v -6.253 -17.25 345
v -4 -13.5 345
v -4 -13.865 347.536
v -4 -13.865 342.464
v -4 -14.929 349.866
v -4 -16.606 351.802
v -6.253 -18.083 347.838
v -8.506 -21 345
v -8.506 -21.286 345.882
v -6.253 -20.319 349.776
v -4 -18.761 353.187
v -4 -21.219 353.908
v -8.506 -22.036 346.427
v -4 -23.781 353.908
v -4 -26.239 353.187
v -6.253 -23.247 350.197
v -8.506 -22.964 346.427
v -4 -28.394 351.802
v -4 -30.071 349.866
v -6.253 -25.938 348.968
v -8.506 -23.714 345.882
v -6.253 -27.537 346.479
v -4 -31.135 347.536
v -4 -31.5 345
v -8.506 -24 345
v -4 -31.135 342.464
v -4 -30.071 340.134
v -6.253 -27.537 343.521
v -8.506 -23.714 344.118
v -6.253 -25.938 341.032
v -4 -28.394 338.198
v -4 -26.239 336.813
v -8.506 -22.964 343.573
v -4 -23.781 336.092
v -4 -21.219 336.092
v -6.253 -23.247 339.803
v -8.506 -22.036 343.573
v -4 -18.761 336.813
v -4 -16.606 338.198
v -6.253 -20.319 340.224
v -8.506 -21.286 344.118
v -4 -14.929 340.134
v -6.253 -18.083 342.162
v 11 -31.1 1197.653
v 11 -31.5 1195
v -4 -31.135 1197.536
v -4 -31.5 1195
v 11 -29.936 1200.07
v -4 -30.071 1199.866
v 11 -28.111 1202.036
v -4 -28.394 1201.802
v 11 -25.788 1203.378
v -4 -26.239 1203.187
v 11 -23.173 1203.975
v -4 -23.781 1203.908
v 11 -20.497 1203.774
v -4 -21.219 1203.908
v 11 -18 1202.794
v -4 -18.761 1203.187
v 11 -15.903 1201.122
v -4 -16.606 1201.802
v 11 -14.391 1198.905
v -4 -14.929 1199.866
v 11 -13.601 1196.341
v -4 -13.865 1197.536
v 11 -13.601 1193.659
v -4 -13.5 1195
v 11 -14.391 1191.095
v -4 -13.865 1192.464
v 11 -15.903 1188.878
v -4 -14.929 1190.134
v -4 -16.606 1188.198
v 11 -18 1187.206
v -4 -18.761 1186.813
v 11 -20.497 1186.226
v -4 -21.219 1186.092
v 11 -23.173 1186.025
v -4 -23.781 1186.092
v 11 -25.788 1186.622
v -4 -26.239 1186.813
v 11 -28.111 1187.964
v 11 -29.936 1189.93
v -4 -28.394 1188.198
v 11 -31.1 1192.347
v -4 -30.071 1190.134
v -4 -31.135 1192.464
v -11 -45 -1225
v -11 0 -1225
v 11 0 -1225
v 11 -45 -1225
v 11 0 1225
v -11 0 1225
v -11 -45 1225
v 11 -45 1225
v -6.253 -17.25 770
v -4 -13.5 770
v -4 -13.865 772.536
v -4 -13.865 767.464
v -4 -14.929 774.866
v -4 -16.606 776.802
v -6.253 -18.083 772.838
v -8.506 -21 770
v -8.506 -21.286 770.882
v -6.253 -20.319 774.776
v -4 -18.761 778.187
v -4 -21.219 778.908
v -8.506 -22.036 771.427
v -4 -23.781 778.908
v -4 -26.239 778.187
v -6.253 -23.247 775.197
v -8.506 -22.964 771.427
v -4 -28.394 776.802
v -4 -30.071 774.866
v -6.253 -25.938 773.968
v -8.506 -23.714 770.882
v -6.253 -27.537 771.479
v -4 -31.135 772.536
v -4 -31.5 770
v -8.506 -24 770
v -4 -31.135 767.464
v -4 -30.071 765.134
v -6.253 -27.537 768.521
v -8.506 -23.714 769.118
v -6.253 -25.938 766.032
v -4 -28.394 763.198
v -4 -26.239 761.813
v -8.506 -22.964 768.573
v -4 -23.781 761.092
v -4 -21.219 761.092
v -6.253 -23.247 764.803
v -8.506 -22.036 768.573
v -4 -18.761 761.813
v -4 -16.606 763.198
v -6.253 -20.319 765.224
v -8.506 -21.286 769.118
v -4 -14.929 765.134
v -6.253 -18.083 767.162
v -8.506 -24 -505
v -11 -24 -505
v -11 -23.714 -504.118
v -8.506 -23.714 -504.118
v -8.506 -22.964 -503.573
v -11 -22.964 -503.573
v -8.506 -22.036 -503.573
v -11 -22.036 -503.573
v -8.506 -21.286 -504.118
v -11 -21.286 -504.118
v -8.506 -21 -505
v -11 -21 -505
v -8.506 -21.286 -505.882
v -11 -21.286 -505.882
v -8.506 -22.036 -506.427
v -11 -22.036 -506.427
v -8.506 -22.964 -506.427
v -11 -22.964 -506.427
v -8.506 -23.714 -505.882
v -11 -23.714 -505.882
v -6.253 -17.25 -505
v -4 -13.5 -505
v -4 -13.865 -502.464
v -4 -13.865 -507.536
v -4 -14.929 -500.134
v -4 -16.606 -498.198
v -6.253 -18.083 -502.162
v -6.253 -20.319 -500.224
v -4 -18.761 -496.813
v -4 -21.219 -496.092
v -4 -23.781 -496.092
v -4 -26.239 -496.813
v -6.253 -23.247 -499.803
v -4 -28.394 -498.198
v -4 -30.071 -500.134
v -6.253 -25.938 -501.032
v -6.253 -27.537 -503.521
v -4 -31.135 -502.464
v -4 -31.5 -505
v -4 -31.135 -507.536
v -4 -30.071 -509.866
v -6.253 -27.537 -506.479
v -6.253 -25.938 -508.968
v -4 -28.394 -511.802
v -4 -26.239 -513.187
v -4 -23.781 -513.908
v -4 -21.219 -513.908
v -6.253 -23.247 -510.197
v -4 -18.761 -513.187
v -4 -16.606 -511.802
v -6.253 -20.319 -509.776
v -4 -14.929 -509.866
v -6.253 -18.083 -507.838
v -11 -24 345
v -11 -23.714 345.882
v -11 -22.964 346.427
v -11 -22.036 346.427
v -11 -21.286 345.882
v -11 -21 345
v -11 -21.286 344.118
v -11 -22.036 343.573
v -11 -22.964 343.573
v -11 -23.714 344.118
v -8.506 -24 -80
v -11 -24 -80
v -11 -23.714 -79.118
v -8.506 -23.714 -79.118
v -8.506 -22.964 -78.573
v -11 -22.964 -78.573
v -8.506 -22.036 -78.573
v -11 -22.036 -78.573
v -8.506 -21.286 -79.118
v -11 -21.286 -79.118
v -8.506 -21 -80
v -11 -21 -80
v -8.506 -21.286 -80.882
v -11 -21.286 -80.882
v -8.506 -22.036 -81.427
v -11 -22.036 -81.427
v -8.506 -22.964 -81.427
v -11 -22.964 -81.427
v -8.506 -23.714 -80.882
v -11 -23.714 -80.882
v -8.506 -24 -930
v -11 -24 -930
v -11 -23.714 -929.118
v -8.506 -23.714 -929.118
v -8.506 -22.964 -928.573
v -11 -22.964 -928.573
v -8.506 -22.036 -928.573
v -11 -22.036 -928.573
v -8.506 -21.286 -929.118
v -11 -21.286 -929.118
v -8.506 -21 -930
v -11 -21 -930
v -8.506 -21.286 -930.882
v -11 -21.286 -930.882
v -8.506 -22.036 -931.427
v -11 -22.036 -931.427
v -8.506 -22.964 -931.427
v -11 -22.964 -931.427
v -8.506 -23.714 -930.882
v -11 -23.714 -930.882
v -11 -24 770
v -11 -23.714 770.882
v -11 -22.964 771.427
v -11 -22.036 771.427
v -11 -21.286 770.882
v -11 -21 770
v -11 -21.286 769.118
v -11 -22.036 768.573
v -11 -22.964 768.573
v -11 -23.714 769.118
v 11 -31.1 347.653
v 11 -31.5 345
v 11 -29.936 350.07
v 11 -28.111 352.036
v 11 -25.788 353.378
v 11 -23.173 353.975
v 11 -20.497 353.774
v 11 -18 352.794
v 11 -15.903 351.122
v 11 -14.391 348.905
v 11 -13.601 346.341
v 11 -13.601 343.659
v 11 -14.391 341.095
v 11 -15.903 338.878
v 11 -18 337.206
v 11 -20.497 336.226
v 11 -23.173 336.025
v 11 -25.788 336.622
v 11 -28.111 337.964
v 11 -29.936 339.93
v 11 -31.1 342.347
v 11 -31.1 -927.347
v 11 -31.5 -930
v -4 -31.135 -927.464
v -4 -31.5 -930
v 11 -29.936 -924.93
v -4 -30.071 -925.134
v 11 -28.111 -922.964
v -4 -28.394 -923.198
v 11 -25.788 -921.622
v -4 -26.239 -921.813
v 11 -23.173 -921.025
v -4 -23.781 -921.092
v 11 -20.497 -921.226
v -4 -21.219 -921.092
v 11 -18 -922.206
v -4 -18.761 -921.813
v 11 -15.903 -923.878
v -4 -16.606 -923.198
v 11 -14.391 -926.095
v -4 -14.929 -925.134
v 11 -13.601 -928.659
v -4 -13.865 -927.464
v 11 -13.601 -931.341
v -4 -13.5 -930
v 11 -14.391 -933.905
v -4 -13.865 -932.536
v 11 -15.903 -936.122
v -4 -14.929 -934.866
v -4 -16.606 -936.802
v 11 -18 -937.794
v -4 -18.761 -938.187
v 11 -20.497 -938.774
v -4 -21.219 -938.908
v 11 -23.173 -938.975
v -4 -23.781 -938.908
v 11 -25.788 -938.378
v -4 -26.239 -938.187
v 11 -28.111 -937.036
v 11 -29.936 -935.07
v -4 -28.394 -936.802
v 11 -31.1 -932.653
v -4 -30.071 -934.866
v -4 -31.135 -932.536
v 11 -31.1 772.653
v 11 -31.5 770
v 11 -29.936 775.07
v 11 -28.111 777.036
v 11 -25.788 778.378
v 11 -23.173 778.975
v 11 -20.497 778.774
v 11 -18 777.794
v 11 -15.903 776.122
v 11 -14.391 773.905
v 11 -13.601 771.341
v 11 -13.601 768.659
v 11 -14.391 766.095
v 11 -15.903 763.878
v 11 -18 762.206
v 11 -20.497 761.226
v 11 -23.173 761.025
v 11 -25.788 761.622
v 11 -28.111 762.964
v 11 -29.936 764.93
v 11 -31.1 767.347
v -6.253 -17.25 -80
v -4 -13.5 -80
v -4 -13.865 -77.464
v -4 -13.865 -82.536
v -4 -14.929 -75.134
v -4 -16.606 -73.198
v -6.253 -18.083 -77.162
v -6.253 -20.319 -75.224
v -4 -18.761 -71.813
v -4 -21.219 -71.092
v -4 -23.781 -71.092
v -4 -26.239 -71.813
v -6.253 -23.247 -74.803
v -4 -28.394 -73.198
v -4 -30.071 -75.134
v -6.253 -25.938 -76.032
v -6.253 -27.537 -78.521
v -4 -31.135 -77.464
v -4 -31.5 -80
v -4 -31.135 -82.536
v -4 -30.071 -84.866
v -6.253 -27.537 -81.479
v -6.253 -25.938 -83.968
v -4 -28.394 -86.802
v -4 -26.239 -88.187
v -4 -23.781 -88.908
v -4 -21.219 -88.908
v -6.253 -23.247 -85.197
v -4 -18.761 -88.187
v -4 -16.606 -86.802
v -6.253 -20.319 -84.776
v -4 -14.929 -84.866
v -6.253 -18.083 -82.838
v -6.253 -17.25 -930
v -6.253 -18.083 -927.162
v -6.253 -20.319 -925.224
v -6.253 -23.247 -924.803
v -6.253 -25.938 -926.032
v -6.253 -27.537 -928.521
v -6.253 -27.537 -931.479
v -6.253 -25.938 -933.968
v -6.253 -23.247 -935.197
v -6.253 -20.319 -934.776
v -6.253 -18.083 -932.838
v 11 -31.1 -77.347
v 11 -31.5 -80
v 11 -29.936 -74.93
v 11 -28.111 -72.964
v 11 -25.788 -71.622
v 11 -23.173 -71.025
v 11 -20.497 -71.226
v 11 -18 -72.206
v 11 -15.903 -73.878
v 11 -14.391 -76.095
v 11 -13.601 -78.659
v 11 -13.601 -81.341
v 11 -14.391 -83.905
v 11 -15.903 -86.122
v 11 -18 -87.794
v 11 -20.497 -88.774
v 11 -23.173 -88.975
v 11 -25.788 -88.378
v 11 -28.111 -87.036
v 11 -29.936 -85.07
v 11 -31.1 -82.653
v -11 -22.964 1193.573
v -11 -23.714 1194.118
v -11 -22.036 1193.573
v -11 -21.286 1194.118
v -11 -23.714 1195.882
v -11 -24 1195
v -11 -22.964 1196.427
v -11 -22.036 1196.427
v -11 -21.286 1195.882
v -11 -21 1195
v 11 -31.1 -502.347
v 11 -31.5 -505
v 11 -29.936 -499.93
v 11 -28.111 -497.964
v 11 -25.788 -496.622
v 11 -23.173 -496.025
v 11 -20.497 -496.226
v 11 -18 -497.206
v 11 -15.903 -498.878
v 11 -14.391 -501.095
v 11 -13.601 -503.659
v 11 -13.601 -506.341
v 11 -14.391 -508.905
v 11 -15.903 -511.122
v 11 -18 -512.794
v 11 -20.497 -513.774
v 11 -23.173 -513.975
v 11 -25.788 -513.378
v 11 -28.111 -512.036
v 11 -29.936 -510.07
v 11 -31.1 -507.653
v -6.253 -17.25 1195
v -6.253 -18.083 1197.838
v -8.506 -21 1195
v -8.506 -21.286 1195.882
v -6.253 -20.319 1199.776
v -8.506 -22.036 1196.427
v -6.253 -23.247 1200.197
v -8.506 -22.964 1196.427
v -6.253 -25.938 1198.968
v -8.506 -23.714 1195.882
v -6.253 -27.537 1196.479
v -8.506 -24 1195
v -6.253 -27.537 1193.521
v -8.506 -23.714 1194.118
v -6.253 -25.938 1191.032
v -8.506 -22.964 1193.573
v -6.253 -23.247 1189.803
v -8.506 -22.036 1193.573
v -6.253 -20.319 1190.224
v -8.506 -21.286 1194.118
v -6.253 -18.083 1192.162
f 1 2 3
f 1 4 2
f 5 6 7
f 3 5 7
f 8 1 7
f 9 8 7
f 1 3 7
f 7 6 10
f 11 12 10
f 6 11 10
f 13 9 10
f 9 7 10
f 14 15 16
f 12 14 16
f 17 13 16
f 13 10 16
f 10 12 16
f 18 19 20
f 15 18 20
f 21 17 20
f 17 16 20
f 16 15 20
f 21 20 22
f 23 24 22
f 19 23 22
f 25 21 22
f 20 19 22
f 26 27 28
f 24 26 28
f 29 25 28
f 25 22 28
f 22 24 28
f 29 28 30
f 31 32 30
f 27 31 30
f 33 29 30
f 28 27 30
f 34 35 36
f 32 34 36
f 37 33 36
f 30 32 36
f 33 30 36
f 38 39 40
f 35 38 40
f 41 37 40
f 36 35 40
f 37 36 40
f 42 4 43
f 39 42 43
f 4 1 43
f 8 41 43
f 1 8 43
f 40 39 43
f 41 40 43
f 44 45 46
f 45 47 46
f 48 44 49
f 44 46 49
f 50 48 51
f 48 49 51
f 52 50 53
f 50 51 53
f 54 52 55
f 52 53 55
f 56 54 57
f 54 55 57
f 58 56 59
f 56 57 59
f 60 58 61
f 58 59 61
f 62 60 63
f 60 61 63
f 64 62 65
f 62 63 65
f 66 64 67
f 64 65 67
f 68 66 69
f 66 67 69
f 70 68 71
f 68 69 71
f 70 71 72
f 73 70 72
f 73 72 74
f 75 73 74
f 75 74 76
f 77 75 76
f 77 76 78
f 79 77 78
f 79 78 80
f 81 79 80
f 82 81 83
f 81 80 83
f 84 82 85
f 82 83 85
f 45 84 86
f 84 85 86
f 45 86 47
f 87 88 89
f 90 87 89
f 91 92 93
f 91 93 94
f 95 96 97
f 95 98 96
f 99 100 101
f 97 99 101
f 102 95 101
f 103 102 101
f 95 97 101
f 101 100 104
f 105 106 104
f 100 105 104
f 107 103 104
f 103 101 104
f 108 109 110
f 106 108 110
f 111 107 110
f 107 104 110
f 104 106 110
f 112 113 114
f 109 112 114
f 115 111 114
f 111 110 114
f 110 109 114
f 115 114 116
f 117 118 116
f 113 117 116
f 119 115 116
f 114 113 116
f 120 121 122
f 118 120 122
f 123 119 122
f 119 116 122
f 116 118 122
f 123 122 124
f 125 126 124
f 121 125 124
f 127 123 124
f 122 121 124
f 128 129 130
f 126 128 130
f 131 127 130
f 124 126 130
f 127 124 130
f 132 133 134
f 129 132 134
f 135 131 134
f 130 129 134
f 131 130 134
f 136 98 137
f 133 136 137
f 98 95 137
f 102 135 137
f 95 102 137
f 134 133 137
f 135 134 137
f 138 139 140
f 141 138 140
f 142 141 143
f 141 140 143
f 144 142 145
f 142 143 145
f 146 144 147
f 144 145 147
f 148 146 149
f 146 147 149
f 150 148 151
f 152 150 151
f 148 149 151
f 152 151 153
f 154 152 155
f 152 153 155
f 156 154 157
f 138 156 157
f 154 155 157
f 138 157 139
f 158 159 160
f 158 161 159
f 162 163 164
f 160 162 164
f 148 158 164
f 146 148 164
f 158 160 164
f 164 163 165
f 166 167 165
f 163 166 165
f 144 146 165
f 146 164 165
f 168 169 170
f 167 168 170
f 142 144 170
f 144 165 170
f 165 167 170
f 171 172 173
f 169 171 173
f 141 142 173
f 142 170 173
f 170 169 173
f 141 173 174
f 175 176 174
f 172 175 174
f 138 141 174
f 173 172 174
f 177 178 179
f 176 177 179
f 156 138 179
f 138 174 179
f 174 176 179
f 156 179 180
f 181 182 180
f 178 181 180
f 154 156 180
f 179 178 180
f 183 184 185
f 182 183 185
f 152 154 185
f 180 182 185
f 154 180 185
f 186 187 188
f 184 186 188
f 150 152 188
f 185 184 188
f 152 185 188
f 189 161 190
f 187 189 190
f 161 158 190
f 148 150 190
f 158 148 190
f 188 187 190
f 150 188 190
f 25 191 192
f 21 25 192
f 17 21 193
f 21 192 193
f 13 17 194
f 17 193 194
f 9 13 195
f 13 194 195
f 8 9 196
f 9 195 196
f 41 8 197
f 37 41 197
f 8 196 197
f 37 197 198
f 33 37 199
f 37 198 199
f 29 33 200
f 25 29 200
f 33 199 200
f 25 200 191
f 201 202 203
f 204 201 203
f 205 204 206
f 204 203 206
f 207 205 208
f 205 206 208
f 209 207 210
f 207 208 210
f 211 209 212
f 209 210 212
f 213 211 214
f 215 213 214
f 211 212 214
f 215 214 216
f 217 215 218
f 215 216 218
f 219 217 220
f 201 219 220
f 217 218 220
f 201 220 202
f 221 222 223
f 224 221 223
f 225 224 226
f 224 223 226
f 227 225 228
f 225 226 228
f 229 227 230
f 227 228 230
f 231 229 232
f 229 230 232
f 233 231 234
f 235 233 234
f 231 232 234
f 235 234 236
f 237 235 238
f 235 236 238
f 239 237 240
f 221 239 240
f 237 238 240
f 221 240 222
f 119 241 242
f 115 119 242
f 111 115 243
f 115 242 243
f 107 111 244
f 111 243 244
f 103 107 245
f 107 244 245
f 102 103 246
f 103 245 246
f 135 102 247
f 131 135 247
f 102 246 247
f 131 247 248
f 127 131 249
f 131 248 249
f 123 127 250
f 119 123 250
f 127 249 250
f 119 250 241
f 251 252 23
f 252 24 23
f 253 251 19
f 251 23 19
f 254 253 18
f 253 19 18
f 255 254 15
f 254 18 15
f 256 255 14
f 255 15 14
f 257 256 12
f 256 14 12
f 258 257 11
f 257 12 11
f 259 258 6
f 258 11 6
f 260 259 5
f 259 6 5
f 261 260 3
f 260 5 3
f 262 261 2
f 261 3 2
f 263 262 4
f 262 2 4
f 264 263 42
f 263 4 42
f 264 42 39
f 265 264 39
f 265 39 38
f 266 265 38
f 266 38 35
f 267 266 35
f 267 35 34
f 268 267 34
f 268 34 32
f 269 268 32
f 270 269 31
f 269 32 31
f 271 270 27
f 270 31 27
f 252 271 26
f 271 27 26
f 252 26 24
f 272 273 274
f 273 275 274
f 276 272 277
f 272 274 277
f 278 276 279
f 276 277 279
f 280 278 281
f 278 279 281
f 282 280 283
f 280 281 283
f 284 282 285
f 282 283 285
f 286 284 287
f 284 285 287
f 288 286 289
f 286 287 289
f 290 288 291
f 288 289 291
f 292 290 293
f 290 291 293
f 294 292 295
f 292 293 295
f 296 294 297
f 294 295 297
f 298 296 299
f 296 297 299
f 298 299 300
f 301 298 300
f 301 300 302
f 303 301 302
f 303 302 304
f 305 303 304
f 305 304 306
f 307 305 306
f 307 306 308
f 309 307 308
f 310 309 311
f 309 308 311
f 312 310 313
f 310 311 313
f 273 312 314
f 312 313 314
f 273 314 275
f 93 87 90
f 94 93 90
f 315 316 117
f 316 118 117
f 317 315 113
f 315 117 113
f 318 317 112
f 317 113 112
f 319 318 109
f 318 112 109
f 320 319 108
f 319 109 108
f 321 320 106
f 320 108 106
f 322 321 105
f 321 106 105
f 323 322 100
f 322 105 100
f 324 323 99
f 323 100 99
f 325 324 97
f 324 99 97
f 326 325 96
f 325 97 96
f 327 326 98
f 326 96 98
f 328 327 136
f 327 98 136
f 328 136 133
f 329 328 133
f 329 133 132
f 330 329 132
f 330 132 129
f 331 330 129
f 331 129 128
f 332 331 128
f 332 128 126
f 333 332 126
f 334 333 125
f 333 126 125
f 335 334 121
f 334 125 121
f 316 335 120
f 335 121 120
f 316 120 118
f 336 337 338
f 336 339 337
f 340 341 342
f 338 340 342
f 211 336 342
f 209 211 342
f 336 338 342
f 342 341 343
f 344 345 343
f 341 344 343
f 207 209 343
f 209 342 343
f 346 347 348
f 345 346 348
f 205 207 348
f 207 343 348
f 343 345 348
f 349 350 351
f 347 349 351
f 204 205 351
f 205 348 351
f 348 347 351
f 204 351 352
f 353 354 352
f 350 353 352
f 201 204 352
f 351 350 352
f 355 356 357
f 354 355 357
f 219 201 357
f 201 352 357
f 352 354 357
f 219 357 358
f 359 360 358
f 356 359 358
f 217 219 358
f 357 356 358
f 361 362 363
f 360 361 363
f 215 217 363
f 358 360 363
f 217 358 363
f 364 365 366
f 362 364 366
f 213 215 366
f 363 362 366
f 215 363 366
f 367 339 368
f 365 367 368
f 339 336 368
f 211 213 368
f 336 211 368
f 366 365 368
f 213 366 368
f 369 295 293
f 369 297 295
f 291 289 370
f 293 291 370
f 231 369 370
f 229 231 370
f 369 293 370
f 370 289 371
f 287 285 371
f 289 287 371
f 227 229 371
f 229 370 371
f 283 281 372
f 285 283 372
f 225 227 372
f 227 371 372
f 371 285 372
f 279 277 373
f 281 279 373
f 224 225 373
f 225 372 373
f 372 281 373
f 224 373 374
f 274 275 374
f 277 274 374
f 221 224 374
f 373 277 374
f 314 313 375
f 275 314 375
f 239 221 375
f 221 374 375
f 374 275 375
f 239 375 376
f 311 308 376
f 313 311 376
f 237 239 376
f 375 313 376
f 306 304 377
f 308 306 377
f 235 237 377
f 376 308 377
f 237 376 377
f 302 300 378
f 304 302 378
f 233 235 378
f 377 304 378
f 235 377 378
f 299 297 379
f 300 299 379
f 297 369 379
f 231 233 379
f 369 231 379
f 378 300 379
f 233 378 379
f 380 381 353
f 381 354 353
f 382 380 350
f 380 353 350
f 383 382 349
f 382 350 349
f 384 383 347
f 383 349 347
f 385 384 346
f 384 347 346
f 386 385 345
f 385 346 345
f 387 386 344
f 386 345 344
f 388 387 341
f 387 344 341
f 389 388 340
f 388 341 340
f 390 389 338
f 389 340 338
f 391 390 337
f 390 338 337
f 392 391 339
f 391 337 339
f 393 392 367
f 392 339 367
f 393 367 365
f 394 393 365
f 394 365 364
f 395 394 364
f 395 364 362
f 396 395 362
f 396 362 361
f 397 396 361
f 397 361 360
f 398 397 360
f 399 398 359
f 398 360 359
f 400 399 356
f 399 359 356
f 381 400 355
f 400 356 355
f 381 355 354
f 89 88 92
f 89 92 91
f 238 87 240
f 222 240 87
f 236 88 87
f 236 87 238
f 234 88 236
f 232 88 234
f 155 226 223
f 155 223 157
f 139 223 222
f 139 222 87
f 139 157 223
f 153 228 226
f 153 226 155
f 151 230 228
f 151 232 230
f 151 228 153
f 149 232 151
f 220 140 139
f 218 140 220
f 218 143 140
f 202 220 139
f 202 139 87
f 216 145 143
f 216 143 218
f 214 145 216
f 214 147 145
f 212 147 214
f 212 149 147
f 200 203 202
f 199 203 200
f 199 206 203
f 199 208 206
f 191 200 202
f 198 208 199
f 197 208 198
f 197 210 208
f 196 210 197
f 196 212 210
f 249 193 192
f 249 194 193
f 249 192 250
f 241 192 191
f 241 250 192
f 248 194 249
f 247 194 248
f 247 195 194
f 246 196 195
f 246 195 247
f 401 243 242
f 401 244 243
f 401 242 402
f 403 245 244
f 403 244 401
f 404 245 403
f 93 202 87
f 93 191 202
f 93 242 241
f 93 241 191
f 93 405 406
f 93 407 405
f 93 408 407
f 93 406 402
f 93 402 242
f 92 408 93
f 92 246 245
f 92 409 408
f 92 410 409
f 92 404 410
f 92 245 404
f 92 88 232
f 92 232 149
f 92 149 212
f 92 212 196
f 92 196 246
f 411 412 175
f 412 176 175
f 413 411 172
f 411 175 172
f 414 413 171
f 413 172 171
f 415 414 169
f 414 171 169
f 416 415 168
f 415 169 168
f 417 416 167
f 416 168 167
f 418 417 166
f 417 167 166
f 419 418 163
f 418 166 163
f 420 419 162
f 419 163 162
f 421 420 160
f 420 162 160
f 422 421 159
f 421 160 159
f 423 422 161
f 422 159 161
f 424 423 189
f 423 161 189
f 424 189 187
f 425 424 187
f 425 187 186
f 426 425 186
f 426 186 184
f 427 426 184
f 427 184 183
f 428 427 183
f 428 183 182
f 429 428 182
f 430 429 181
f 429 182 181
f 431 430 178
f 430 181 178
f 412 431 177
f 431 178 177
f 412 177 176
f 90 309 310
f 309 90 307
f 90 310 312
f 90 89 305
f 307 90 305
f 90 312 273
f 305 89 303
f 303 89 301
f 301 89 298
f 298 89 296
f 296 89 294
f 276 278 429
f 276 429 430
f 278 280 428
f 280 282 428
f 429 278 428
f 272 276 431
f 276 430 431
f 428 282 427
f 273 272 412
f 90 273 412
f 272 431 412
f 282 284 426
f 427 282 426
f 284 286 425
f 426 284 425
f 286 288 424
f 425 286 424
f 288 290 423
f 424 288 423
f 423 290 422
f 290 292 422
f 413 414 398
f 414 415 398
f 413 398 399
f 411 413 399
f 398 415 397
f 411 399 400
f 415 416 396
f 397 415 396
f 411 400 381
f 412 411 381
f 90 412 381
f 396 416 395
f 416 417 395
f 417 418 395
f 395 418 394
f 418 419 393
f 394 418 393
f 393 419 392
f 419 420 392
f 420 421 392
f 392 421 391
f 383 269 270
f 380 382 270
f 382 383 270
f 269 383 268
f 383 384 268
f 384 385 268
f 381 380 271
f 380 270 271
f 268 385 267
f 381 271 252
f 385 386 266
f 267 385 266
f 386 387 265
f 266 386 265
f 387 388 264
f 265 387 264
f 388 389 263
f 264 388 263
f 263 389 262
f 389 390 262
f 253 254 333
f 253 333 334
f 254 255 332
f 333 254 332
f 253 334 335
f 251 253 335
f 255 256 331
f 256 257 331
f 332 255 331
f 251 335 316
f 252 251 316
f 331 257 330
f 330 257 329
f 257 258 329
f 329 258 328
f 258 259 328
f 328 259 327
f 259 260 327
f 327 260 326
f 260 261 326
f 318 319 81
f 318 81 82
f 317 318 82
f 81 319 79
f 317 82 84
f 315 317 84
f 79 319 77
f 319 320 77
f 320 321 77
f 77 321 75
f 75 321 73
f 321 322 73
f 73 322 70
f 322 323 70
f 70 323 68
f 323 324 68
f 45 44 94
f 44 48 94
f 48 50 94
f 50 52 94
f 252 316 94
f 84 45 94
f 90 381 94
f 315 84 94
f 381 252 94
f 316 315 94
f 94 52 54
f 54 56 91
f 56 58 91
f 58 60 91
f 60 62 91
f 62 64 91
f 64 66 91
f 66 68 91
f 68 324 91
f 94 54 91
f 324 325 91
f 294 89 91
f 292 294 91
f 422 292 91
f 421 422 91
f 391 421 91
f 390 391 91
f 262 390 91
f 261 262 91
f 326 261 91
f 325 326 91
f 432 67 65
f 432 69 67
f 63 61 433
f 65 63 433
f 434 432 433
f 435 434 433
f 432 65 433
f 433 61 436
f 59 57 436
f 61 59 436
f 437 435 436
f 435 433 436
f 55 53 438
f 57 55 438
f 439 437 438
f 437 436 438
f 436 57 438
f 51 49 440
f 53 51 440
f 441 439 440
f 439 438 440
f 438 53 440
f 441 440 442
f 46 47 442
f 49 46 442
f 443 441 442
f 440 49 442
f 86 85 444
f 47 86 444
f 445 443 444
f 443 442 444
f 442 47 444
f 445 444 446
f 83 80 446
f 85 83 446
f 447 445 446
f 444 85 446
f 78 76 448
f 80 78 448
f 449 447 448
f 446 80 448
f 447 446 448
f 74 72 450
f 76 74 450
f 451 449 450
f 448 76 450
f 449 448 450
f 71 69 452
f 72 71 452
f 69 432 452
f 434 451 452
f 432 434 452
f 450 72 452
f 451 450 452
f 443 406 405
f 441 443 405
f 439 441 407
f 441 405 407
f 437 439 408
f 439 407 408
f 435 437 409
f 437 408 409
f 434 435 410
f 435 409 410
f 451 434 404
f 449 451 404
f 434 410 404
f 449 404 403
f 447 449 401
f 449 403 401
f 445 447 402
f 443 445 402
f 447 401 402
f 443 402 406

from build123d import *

# Parameters (mm, degrees)
F0_W     = 22
F0_H     = 2450
F1_DEPTH = 45
F3_D     = 3
F4_D     = 18
F4_DEPTH = 15
F4_TIP   = 5.4077455712


with BuildPart() as f1:
    # F0 (on Front) → F1 (new body)
    with BuildSketch(Plane.XZ):
        Rectangle(F0_W, F0_H)
    extrude(amount=F1_DEPTH)

    # F3 (through all)
    with Locations(Plane.YZ.offset(11)):
        with Locations((-22.5, 1195), (-22.5, 770), (-22.5, 345), (-22.5, -80), (-22.5, -505), (-22.5, -930)):
            Hole(F3_D / 2)

    # F4
    with Locations(Plane.YZ.offset(11)):
        with Locations((-22.5, 1195), (-22.5, 770), (-22.5, 345), (-22.5, -80), (-22.5, -505), (-22.5, -930)):
            Hole(F4_D / 2, depth=F4_DEPTH)
            with Locations((0, 0, -(F4_DEPTH + F4_TIP / 2))):  # 118° drill point
                Cone(0, F4_D / 2, F4_TIP, mode=Mode.SUBTRACT)


solid = f1.part
